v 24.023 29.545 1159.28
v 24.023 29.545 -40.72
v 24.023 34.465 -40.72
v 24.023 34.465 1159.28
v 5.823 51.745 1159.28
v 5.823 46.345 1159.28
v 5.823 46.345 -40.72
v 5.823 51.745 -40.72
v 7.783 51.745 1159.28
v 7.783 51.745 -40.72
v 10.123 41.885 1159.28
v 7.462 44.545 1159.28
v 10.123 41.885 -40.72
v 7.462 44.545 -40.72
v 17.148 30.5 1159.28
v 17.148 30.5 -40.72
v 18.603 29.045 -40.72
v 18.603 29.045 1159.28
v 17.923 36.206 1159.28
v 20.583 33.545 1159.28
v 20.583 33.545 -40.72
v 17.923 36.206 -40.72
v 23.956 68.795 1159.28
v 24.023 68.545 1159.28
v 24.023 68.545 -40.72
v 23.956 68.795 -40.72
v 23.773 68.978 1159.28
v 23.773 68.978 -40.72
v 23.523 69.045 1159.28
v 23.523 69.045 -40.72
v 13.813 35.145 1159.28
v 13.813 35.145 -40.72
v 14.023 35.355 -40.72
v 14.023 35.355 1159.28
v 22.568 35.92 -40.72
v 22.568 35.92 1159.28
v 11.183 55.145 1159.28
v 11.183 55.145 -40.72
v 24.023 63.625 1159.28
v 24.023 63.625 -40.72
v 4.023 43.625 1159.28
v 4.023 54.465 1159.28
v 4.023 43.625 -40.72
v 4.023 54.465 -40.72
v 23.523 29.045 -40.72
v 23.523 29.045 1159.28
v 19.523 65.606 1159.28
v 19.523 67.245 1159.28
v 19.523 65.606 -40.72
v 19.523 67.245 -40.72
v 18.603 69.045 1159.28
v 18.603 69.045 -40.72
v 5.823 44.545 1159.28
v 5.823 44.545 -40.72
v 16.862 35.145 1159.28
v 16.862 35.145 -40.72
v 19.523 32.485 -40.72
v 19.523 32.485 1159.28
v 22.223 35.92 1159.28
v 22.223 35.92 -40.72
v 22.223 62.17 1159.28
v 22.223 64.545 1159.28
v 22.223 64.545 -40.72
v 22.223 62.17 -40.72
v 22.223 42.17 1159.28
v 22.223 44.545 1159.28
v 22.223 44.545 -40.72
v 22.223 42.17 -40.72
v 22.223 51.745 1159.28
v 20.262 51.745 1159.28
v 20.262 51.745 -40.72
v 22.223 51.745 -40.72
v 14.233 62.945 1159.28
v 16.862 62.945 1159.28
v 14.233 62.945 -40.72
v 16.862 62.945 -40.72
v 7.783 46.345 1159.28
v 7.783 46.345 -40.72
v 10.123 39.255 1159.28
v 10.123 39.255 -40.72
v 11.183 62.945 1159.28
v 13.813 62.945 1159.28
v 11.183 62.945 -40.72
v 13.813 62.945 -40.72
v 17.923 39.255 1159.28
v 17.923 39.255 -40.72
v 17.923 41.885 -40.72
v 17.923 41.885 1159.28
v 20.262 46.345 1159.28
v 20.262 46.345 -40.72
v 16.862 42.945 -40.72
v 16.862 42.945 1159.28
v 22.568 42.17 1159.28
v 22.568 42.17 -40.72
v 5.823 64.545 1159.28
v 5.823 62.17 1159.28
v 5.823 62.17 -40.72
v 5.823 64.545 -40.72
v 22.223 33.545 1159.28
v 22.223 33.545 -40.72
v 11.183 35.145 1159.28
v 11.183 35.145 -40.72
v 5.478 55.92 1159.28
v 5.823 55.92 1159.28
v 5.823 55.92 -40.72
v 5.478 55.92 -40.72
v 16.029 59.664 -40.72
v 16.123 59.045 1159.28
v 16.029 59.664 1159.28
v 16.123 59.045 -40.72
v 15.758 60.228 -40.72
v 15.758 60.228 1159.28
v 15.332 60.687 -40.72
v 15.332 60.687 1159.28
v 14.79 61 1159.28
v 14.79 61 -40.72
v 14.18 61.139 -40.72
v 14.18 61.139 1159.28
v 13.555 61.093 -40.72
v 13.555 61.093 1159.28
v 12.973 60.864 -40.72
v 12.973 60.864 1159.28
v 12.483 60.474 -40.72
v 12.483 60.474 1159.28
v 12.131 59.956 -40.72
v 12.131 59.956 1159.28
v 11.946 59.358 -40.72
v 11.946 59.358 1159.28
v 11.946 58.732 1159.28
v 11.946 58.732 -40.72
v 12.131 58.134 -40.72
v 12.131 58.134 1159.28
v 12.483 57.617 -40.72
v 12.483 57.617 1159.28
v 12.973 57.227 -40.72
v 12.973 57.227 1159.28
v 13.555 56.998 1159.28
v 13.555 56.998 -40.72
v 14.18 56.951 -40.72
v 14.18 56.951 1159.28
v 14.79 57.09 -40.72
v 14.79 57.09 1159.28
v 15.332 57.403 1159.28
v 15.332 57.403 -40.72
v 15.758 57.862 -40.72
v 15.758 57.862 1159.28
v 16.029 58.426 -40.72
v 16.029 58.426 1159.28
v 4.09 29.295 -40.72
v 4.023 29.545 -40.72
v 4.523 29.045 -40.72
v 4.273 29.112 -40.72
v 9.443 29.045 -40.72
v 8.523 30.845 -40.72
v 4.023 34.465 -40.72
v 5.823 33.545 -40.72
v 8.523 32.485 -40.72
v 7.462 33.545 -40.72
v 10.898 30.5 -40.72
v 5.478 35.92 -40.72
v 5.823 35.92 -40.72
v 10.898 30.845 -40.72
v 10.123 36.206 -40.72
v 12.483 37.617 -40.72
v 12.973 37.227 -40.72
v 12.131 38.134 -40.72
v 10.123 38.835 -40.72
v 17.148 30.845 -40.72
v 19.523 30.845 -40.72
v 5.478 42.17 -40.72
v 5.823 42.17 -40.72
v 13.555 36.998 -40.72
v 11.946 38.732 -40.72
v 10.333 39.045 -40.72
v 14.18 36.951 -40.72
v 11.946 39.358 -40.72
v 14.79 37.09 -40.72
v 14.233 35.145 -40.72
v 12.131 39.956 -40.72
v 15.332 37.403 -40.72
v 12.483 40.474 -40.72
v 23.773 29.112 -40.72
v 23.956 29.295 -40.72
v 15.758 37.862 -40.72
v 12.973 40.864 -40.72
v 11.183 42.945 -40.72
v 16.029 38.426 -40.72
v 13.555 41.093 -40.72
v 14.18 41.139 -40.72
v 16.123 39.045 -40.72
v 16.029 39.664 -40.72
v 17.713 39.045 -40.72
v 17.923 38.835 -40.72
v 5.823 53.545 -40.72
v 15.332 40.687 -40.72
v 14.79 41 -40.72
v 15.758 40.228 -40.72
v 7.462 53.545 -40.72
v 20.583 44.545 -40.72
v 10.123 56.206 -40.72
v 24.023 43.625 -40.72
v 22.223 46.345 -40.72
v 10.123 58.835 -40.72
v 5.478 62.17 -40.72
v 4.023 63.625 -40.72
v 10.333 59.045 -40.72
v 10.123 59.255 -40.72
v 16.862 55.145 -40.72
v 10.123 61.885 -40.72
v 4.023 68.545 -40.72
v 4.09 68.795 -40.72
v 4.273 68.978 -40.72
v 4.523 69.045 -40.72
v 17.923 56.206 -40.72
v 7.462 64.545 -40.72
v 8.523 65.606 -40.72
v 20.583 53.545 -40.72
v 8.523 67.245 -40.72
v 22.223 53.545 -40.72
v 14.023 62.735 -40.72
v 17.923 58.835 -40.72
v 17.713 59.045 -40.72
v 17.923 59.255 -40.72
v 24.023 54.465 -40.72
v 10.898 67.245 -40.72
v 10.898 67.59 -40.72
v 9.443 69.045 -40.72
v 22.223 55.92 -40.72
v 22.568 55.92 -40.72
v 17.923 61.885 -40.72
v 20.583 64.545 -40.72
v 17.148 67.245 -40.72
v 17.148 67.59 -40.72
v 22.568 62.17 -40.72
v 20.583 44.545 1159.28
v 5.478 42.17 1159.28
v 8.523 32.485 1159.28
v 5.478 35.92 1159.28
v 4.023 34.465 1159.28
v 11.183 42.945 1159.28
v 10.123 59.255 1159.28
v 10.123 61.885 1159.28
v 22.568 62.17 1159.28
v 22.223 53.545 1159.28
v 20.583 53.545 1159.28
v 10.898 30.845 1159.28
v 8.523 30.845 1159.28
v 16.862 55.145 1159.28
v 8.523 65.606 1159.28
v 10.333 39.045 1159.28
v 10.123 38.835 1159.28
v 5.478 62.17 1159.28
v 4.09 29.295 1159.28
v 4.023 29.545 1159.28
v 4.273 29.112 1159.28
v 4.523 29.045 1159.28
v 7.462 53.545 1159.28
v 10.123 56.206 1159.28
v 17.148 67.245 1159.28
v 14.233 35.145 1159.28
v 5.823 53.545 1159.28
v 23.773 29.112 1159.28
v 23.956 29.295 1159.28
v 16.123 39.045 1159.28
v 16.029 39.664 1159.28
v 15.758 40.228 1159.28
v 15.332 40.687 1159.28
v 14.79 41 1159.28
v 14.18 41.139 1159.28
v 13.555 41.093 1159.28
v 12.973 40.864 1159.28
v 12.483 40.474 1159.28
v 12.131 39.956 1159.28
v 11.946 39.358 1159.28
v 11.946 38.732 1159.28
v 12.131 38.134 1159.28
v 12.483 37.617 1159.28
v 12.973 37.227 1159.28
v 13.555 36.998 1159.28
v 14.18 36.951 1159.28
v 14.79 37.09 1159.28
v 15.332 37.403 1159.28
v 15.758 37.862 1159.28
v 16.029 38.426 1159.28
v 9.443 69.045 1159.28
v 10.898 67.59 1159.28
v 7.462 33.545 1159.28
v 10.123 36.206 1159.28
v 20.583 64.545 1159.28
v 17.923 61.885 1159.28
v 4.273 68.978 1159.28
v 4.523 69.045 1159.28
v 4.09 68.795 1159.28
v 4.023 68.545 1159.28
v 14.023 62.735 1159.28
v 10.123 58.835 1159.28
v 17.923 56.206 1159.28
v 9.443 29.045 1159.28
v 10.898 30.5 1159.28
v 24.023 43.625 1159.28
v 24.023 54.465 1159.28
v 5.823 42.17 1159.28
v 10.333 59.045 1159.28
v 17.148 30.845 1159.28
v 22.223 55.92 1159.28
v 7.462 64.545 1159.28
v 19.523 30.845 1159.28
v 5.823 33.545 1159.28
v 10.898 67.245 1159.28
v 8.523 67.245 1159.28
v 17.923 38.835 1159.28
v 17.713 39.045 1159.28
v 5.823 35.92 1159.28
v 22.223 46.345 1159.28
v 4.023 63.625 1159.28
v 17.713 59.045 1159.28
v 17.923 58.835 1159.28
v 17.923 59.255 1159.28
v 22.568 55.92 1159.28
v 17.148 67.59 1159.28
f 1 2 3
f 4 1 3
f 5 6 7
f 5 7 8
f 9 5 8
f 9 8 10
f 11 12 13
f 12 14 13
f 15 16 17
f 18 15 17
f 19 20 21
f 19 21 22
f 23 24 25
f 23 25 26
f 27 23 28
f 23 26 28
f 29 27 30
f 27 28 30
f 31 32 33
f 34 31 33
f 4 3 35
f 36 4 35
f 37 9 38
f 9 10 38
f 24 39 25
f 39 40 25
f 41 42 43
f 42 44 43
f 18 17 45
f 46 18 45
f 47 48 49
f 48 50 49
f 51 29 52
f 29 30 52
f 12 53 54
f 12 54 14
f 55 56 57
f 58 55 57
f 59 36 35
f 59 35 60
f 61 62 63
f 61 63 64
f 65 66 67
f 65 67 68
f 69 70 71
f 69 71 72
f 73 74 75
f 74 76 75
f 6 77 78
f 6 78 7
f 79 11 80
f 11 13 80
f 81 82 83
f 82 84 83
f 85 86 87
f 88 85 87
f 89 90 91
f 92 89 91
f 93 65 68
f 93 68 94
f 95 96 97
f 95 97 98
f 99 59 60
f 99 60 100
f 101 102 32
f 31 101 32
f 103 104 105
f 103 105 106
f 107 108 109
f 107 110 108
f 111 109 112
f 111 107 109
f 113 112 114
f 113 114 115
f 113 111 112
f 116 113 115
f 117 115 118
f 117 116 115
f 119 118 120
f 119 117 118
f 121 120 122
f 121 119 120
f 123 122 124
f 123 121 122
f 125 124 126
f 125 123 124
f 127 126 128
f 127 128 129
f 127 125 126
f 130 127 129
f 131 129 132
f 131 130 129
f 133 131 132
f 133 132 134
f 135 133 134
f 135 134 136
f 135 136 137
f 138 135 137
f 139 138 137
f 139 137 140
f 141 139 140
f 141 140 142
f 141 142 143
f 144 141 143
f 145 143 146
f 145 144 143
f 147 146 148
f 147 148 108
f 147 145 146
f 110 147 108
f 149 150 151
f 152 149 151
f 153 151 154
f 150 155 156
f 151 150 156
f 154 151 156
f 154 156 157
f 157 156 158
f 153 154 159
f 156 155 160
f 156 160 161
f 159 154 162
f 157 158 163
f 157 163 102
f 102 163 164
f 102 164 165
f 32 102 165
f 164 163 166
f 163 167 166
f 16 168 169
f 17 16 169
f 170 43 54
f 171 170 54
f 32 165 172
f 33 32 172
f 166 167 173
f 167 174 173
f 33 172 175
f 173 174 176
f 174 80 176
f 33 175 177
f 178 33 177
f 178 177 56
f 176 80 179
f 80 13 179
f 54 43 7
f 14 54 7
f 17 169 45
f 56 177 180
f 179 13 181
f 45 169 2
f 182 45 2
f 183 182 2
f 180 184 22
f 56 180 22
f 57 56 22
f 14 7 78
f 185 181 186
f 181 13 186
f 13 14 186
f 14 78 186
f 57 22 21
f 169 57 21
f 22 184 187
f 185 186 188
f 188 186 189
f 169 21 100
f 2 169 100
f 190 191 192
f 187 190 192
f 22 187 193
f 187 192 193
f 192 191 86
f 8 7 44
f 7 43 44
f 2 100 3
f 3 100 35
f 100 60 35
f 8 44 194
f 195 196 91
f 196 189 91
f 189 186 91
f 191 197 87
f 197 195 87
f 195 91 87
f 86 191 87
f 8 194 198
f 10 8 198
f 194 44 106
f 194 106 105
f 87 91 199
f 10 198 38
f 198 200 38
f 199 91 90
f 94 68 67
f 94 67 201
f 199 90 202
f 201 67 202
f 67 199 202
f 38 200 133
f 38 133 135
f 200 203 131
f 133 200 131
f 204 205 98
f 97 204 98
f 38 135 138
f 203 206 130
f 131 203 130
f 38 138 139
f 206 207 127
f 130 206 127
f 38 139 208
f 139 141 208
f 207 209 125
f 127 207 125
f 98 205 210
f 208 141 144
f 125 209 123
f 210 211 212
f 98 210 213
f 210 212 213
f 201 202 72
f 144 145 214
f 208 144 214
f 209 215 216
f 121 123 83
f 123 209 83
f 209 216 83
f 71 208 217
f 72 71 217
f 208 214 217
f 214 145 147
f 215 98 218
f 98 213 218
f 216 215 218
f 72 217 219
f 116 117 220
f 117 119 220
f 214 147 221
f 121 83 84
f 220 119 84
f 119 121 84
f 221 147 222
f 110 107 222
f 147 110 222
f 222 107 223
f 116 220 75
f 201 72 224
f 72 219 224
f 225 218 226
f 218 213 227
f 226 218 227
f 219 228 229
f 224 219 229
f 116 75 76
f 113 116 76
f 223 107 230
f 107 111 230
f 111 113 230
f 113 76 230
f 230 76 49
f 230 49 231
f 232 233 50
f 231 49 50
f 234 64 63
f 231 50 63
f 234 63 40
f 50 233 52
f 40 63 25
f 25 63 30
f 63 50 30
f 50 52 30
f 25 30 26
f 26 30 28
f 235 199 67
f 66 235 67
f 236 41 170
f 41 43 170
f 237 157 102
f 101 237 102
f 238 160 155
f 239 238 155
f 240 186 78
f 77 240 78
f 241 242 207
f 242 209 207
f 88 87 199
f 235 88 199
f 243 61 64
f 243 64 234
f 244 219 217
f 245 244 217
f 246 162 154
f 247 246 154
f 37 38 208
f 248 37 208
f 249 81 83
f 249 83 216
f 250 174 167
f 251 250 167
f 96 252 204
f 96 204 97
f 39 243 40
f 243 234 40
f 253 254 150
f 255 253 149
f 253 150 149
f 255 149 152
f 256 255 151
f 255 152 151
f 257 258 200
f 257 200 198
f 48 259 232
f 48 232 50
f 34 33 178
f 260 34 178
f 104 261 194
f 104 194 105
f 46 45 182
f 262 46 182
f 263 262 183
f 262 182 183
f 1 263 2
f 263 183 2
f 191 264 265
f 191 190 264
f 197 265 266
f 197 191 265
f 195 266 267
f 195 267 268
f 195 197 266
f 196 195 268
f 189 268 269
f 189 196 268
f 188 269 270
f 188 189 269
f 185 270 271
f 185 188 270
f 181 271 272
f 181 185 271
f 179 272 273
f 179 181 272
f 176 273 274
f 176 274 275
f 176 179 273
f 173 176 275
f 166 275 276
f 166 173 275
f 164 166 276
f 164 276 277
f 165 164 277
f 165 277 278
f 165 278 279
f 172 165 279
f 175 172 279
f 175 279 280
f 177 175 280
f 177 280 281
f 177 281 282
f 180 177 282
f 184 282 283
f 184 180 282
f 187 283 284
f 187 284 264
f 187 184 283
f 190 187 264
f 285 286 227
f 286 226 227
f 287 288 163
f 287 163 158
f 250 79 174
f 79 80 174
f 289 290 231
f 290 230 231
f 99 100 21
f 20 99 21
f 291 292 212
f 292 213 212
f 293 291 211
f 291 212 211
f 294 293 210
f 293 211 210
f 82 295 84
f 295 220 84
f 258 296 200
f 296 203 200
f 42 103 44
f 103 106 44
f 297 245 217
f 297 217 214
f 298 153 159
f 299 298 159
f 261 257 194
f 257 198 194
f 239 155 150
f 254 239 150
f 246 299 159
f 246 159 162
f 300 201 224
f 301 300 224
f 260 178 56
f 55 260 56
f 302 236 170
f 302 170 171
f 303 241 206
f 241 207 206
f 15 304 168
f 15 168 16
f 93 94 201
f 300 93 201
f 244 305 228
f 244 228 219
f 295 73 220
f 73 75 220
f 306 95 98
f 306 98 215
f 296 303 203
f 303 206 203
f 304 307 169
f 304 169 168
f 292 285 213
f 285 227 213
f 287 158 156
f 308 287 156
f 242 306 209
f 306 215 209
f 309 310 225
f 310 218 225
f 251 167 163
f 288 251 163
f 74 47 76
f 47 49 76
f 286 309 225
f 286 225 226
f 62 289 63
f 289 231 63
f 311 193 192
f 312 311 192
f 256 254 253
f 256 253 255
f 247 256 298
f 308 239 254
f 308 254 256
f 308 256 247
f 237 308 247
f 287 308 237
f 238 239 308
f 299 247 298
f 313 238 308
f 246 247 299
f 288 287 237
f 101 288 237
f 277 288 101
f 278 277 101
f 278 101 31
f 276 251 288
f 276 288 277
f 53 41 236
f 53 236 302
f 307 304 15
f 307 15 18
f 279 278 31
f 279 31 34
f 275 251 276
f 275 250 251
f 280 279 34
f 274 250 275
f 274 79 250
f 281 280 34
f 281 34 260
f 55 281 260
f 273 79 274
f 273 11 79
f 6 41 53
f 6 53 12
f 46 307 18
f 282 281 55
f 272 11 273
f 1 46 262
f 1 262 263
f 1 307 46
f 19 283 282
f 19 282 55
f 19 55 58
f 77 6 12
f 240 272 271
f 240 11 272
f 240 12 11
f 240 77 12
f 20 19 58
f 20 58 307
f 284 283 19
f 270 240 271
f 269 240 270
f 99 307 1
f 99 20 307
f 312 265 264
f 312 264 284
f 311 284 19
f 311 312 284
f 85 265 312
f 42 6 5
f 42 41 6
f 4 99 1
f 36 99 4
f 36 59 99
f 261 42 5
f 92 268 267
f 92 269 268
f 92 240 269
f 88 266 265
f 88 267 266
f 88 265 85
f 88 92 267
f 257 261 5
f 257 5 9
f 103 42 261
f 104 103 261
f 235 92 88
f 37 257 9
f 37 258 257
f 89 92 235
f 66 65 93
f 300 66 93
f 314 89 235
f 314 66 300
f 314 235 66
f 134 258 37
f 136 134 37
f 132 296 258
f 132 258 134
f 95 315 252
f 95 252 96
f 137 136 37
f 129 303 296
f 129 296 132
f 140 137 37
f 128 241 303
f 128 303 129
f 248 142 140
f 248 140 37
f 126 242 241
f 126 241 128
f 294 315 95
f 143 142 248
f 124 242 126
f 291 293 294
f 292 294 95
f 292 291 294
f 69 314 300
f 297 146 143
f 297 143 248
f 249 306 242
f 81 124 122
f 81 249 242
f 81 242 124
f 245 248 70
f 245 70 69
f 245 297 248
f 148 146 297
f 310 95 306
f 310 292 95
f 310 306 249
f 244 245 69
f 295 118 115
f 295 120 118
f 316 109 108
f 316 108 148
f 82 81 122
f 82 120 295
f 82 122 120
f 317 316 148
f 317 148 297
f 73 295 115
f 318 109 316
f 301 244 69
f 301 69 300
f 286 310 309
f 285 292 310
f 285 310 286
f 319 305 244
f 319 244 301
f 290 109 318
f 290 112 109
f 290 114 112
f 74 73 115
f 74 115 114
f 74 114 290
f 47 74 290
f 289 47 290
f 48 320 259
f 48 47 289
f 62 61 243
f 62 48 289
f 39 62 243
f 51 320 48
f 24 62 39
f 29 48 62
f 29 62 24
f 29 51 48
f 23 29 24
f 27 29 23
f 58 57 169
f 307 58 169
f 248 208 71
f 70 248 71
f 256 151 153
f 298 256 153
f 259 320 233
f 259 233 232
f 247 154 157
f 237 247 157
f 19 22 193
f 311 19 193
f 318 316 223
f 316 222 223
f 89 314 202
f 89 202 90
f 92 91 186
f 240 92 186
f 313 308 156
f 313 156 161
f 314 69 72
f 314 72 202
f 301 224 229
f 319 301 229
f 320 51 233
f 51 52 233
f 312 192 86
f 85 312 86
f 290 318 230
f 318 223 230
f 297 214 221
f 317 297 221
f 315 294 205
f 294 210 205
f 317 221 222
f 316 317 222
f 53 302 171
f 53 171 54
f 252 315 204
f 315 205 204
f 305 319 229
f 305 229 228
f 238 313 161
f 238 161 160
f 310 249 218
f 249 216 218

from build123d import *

# Parameters (mm, degrees)
V_SLOT_START                            = -40.720177315
V_SLOT_20X40X1000_LINEAR_RAIL_OUTLINE_R = 2.1
V_SLOT_20X40X1000_LINEAR_RAIL_DEPTH     = 1000
SKETCH1_R                               = 2.1
BOSS_EXTRUDE1_DEPTH                     = 200


# Read off the part's stored shape, not the designer's step: V-Slot 20x40x1000 Linear Rail
with BuildPart() as part:
    # V-Slot 20x40x1000 Linear Rail outline → V-Slot 20x40x1000 Linear Rail (new body)
    with BuildSketch(Plane.XY.offset(V_SLOT_START)):
        with BuildLine():
            Line((17.922647509, 56.20590772), (17.922647509, 58.835247549))
            Line((17.922647509, 58.835247549), (17.712647509, 59.045247549))
            Line((17.712647509, 59.045247549), (17.922647509, 59.255247549))
            Line((17.922647509, 59.255247549), (17.922647509, 61.884587377))
            Line((17.922647509, 61.884587377), (20.583307681, 64.545247549))
            Line((20.583307681, 64.545247549), (22.222647509, 64.545247549))
            Line((22.222647509, 64.545247549), (22.222647509, 62.170247549))
            Line((22.222647509, 62.170247549), (22.567647509, 62.170247549))
            Line((22.567647509, 62.170247549), (24.022647509, 63.625247549))
            Line((24.022647509, 63.625247549), (24.022647509, 68.545247549))
            ThreePointArc((24.022647509, 68.545247549), (23.876200899, 68.898800939), (23.522647509, 69.045247549))
            Line((23.522647509, 69.045247549), (18.602647509, 69.045247549))
            Line((18.602647509, 69.045247549), (17.147647509, 67.590247549))
            Line((17.147647509, 67.590247549), (17.147647509, 67.245247549))
            Line((17.147647509, 67.245247549), (19.522647509, 67.245247549))
            Line((19.522647509, 67.245247549), (19.522647509, 65.60590772))
            Line((19.522647509, 65.60590772), (16.861987337, 62.945247549))
            Line((16.861987337, 62.945247549), (14.232647509, 62.945247549))
            Line((14.232647509, 62.945247549), (14.022647509, 62.735247549))
            Line((14.022647509, 62.735247549), (13.812647509, 62.945247549))
            Line((13.812647509, 62.945247549), (11.183307681, 62.945247549))
            Line((11.183307681, 62.945247549), (8.522647509, 65.60590772))
            Line((8.522647509, 65.60590772), (8.522647509, 67.245247549))
            Line((8.522647509, 67.245247549), (10.897647509, 67.245247549))
            Line((10.897647509, 67.245247549), (10.897647509, 67.590247549))
            Line((10.897647509, 67.590247549), (9.442647509, 69.045247549))
            Line((9.442647509, 69.045247549), (4.522647509, 69.045247549))
            ThreePointArc((4.522647509, 69.045247549), (4.169094118, 68.898800939), (4.022647509, 68.545247549))
            Line((4.022647509, 68.545247549), (4.022647509, 63.625247549))
            Line((4.022647509, 63.625247549), (5.477647509, 62.170247549))
            Line((5.477647509, 62.170247549), (5.822647509, 62.170247549))
            Line((5.822647509, 62.170247549), (5.822647509, 64.545247549))
            Line((5.822647509, 64.545247549), (7.461987337, 64.545247549))
            Line((7.461987337, 64.545247549), (10.122647509, 61.884587377))
            Line((10.122647509, 61.884587377), (10.122647509, 59.255247549))
            Line((10.122647509, 59.255247549), (10.332647509, 59.045247549))
            Line((10.332647509, 59.045247549), (10.122647509, 58.835247549))
            Line((10.122647509, 58.835247549), (10.122647509, 56.20590772))
            Line((10.122647509, 56.20590772), (7.461987337, 53.545247549))
            Line((7.461987337, 53.545247549), (5.822647509, 53.545247549))
            Line((5.822647509, 53.545247549), (5.822647509, 55.920247549))
            Line((5.822647509, 55.920247549), (5.477647509, 55.920247549))
            Line((5.477647509, 55.920247549), (4.022647509, 54.465247549))
            Line((4.022647509, 54.465247549), (4.022647509, 43.625247549))
            Line((4.022647509, 43.625247549), (5.477647509, 42.170247549))
            Line((5.477647509, 42.170247549), (5.822647509, 42.170247549))
            Line((5.822647509, 42.170247549), (5.822647509, 44.545247549))
            Line((5.822647509, 44.545247549), (7.461987337, 44.545247549))
            Line((7.461987337, 44.545247549), (10.122647509, 41.884587377))
            Line((10.122647509, 41.884587377), (10.122647509, 39.255247549))
            Line((10.122647509, 39.255247549), (10.332647509, 39.045247549))
            Line((10.332647509, 39.045247549), (10.122647509, 38.835247549))
            Line((10.122647509, 38.835247549), (10.122647509, 36.20590772))
            Line((10.122647509, 36.20590772), (7.461987337, 33.545247549))
            Line((7.461987337, 33.545247549), (5.822647509, 33.545247549))
            Line((5.822647509, 33.545247549), (5.822647509, 35.920247549))
            Line((5.822647509, 35.920247549), (5.477647509, 35.920247549))
            Line((5.477647509, 35.920247549), (4.022647509, 34.465247549))
            Line((4.022647509, 34.465247549), (4.022647509, 29.545247549))
            ThreePointArc((4.022647509, 29.545247549), (4.169094118, 29.191694158), (4.522647509, 29.045247549))
            Line((4.522647509, 29.045247549), (9.442647509, 29.045247549))
            Line((9.442647509, 29.045247549), (10.897647509, 30.500247549))
            Line((10.897647509, 30.500247549), (10.897647509, 30.845247549))
            Line((10.897647509, 30.845247549), (8.522647509, 30.845247549))
            Line((8.522647509, 30.845247549), (8.522647509, 32.484587377))
            Line((8.522647509, 32.484587377), (11.183307681, 35.145247549))
            Line((11.183307681, 35.145247549), (13.812647509, 35.145247549))
            Line((13.812647509, 35.145247549), (14.022647509, 35.355247549))
            Line((14.022647509, 35.355247549), (14.232647509, 35.145247549))
            Line((14.232647509, 35.145247549), (16.861987337, 35.145247549))
            Line((16.861987337, 35.145247549), (19.522647509, 32.484587377))
            Line((19.522647509, 32.484587377), (19.522647509, 30.845247549))
            Line((19.522647509, 30.845247549), (17.147647509, 30.845247549))
            Line((17.147647509, 30.845247549), (17.147647509, 30.500247549))
            Line((17.147647509, 30.500247549), (18.602647509, 29.045247549))
            Line((18.602647509, 29.045247549), (23.522647509, 29.045247549))
            ThreePointArc((23.522647509, 29.045247549), (23.876200899, 29.191694158), (24.022647509, 29.545247549))
            Line((24.022647509, 29.545247549), (24.022647509, 34.465247549))
            Line((24.022647509, 34.465247549), (22.567647509, 35.920247549))
            Line((22.567647509, 35.920247549), (22.222647509, 35.920247549))
            Line((22.222647509, 35.920247549), (22.222647509, 33.545247549))
            Line((22.222647509, 33.545247549), (20.583307681, 33.545247549))
            Line((20.583307681, 33.545247549), (17.922647509, 36.20590772))
            Line((17.922647509, 36.20590772), (17.922647509, 38.835247549))
            Line((17.922647509, 38.835247549), (17.712647509, 39.045247549))
            Line((17.712647509, 39.045247549), (17.922647509, 39.255247549))
            Line((17.922647509, 39.255247549), (17.922647509, 41.884587377))
            Line((17.922647509, 41.884587377), (20.583307681, 44.545247549))
            Line((20.583307681, 44.545247549), (22.222647509, 44.545247549))
            Line((22.222647509, 44.545247549), (22.222647509, 42.170247549))
            Line((22.222647509, 42.170247549), (22.567647509, 42.170247549))
            Line((22.567647509, 42.170247549), (24.022647509, 43.625247549))
            Line((24.022647509, 43.625247549), (24.022647509, 54.465247549))
            Line((24.022647509, 54.465247549), (22.567647509, 55.920247549))
            Line((22.567647509, 55.920247549), (22.222647509, 55.920247549))
            Line((22.222647509, 55.920247549), (22.222647509, 53.545247549))
            Line((22.222647509, 53.545247549), (20.583307681, 53.545247549))
            Line((20.583307681, 53.545247549), (17.922647509, 56.20590772))
        make_face()
        with Locations((14.022647509, 39.045247549)):
            Circle(V_SLOT_20X40X1000_LINEAR_RAIL_OUTLINE_R, mode=Mode.SUBTRACT)
        Polygon((11.183307681, 42.945247549), (7.783307681, 46.345247549), (5.822647509, 46.345247549), (5.822647509, 51.745247549), (7.783307681, 51.745247549), (11.183307681, 55.145247549), (16.861987337, 55.145247549), (20.261987337, 51.745247549), (22.222647509, 51.745247549), (22.222647509, 46.345247549), (20.261987337, 46.345247549), (16.861987337, 42.945247549), align=None, mode=Mode.SUBTRACT)
        with Locations((14.022647509, 59.045247549)):
            Circle(V_SLOT_20X40X1000_LINEAR_RAIL_OUTLINE_R, mode=Mode.SUBTRACT)
    extrude(amount=V_SLOT_20X40X1000_LINEAR_RAIL_DEPTH)

    # Sketch1 → Boss-Extrude1 (add)
    with BuildSketch(Plane.XY.offset(959.279822685)):
        with BuildLine():
            Line((17.922647509, 58.835247549), (17.712647509, 59.045247549))
            Line((17.712647509, 59.045247549), (17.922647509, 59.255247549))
            Line((17.922647509, 59.255247549), (17.922647509, 61.884587377))
            Line((17.922647509, 61.884587377), (20.583307681, 64.545247549))
            Line((20.583307681, 64.545247549), (22.222647509, 64.545247549))
            Line((22.222647509, 64.545247549), (22.222647509, 62.170247549))
            Line((22.222647509, 62.170247549), (22.567647509, 62.170247549))
            Line((22.567647509, 62.170247549), (24.022647509, 63.625247549))
            Line((24.022647509, 63.625247549), (24.022647509, 68.545247549))
            ThreePointArc((24.022647509, 68.545247549), (23.876200899, 68.898800939), (23.522647509, 69.045247549))
            Line((23.522647509, 69.045247549), (18.602647509, 69.045247549))
            Line((18.602647509, 69.045247549), (17.147647509, 67.590247549))
            Line((17.147647509, 67.590247549), (17.147647509, 67.245247549))
            Line((17.147647509, 67.245247549), (19.522647509, 67.245247549))
            Line((19.522647509, 67.245247549), (19.522647509, 65.60590772))
            Line((19.522647509, 65.60590772), (16.861987337, 62.945247549))
            Line((16.861987337, 62.945247549), (14.232647509, 62.945247549))
            Line((14.232647509, 62.945247549), (14.022647509, 62.735247549))
            Line((14.022647509, 62.735247549), (13.812647509, 62.945247549))
            Line((13.812647509, 62.945247549), (11.183307681, 62.945247549))
            Line((11.183307681, 62.945247549), (8.522647509, 65.60590772))
            Line((8.522647509, 65.60590772), (8.522647509, 67.245247549))
            Line((8.522647509, 67.245247549), (10.897647509, 67.245247549))
            Line((10.897647509, 67.245247549), (10.897647509, 67.590247549))
            Line((10.897647509, 67.590247549), (9.442647509, 69.045247549))
            Line((9.442647509, 69.045247549), (4.522647509, 69.045247549))
            ThreePointArc((4.522647509, 69.045247549), (4.169094118, 68.898800939), (4.022647509, 68.545247549))
            Line((4.022647509, 68.545247549), (4.022647509, 63.625247549))
            Line((4.022647509, 63.625247549), (5.477647509, 62.170247549))
            Line((5.477647509, 62.170247549), (5.822647509, 62.170247549))
            Line((5.822647509, 62.170247549), (5.822647509, 64.545247549))
            Line((5.822647509, 64.545247549), (7.461987337, 64.545247549))
            Line((7.461987337, 64.545247549), (10.122647509, 61.884587377))
            Line((10.122647509, 61.884587377), (10.122647509, 59.255247549))
            Line((10.122647509, 59.255247549), (10.332647509, 59.045247549))
            Line((10.332647509, 59.045247549), (10.122647509, 58.835247549))
            Line((10.122647509, 58.835247549), (10.122647509, 56.20590772))
            Line((10.122647509, 56.20590772), (7.461987337, 53.545247549))
            Line((7.461987337, 53.545247549), (5.822647509, 53.545247549))
            Line((5.822647509, 53.545247549), (5.822647509, 55.920247549))
            Line((5.822647509, 55.920247549), (5.477647509, 55.920247549))
            Line((5.477647509, 55.920247549), (4.022647509, 54.465247549))
            Line((4.022647509, 54.465247549), (4.022647509, 43.625247549))
            Line((4.022647509, 43.625247549), (5.477647509, 42.170247549))
            Line((5.477647509, 42.170247549), (5.822647509, 42.170247549))
            Line((5.822647509, 42.170247549), (5.822647509, 44.545247549))
            Line((5.822647509, 44.545247549), (7.461987337, 44.545247549))
            Line((7.461987337, 44.545247549), (10.122647509, 41.884587377))
            Line((10.122647509, 41.884587377), (10.122647509, 39.255247549))
            Line((10.122647509, 39.255247549), (10.332647509, 39.045247549))
            Line((10.332647509, 39.045247549), (10.122647509, 38.835247549))
            Line((10.122647509, 38.835247549), (10.122647509, 36.20590772))
            Line((10.122647509, 36.20590772), (7.461987337, 33.545247549))
            Line((7.461987337, 33.545247549), (5.822647509, 33.545247549))
            Line((5.822647509, 33.545247549), (5.822647509, 35.920247549))
            Line((5.822647509, 35.920247549), (5.477647509, 35.920247549))
            Line((5.477647509, 35.920247549), (4.022647509, 34.465247549))
            Line((4.022647509, 34.465247549), (4.022647509, 29.545247549))
            ThreePointArc((4.022647509, 29.545247549), (4.169094118, 29.191694158), (4.522647509, 29.045247549))
            Line((4.522647509, 29.045247549), (9.442647509, 29.045247549))
            Line((9.442647509, 29.045247549), (10.897647509, 30.500247549))
            Line((10.897647509, 30.500247549), (10.897647509, 30.845247549))
            Line((10.897647509, 30.845247549), (8.522647509, 30.845247549))
            Line((8.522647509, 30.845247549), (8.522647509, 32.484587377))
            Line((8.522647509, 32.484587377), (11.183307681, 35.145247549))
            Line((11.183307681, 35.145247549), (13.812647509, 35.145247549))
            Line((13.812647509, 35.145247549), (14.022647509, 35.355247549))
            Line((14.022647509, 35.355247549), (14.232647509, 35.145247549))
            Line((14.232647509, 35.145247549), (16.861987337, 35.145247549))
            Line((16.861987337, 35.145247549), (19.522647509, 32.484587377))
            Line((19.522647509, 32.484587377), (19.522647509, 30.845247549))
            Line((19.522647509, 30.845247549), (17.147647509, 30.845247549))
            Line((17.147647509, 30.845247549), (17.147647509, 30.500247549))
            Line((17.147647509, 30.500247549), (18.602647509, 29.045247549))
            Line((18.602647509, 29.045247549), (23.522647509, 29.045247549))
            ThreePointArc((23.522647509, 29.045247549), (23.876200899, 29.191694158), (24.022647509, 29.545247549))
            Line((24.022647509, 29.545247549), (24.022647509, 34.465247549))
            Line((24.022647509, 34.465247549), (22.567647509, 35.920247549))
            Line((22.567647509, 35.920247549), (22.222647509, 35.920247549))
            Line((22.222647509, 35.920247549), (22.222647509, 33.545247549))
            Line((22.222647509, 33.545247549), (20.583307681, 33.545247549))
            Line((20.583307681, 33.545247549), (17.922647509, 36.20590772))
            Line((17.922647509, 36.20590772), (17.922647509, 38.835247549))
            Line((17.922647509, 38.835247549), (17.712647509, 39.045247549))
            Line((17.712647509, 39.045247549), (17.922647509, 39.255247549))
            Line((17.922647509, 39.255247549), (17.922647509, 41.884587377))
            Line((17.922647509, 41.884587377), (20.583307681, 44.545247549))
            Line((20.583307681, 44.545247549), (22.222647509, 44.545247549))
            Line((22.222647509, 44.545247549), (22.222647509, 42.170247549))
            Line((22.222647509, 42.170247549), (22.567647509, 42.170247549))
            Line((22.567647509, 42.170247549), (24.022647509, 43.625247549))
            Line((24.022647509, 43.625247549), (24.022647509, 54.465247549))
            Line((24.022647509, 54.465247549), (22.567647509, 55.920247549))
            Line((22.567647509, 55.920247549), (22.222647509, 55.920247549))
            Line((22.222647509, 55.920247549), (22.222647509, 53.545247549))
            Line((22.222647509, 53.545247549), (20.583307681, 53.545247549))
            Line((20.583307681, 53.545247549), (17.922647509, 56.20590772))
            Line((17.922647509, 56.20590772), (17.922647509, 58.835247549))
        make_face()
        with Locations((14.022647509, 39.045247549)):
            Circle(SKETCH1_R, mode=Mode.SUBTRACT)
        with Locations((14.022647509, 59.045247549)):
            Circle(SKETCH1_R, mode=Mode.SUBTRACT)
        Polygon((7.783307681, 51.745247549), (11.183307681, 55.145247549), (16.861987337, 55.145247549), (20.261987337, 51.745247549), (22.222647509, 51.745247549), (22.222647509, 46.345247549), (20.261987337, 46.345247549), (16.861987337, 42.945247549), (11.183307681, 42.945247549), (7.783307681, 46.345247549), (5.822647509, 46.345247549), (5.822647509, 51.745247549), align=None, mode=Mode.SUBTRACT)
    extrude(amount=BOSS_EXTRUDE1_DEPTH)


solid = part.part
